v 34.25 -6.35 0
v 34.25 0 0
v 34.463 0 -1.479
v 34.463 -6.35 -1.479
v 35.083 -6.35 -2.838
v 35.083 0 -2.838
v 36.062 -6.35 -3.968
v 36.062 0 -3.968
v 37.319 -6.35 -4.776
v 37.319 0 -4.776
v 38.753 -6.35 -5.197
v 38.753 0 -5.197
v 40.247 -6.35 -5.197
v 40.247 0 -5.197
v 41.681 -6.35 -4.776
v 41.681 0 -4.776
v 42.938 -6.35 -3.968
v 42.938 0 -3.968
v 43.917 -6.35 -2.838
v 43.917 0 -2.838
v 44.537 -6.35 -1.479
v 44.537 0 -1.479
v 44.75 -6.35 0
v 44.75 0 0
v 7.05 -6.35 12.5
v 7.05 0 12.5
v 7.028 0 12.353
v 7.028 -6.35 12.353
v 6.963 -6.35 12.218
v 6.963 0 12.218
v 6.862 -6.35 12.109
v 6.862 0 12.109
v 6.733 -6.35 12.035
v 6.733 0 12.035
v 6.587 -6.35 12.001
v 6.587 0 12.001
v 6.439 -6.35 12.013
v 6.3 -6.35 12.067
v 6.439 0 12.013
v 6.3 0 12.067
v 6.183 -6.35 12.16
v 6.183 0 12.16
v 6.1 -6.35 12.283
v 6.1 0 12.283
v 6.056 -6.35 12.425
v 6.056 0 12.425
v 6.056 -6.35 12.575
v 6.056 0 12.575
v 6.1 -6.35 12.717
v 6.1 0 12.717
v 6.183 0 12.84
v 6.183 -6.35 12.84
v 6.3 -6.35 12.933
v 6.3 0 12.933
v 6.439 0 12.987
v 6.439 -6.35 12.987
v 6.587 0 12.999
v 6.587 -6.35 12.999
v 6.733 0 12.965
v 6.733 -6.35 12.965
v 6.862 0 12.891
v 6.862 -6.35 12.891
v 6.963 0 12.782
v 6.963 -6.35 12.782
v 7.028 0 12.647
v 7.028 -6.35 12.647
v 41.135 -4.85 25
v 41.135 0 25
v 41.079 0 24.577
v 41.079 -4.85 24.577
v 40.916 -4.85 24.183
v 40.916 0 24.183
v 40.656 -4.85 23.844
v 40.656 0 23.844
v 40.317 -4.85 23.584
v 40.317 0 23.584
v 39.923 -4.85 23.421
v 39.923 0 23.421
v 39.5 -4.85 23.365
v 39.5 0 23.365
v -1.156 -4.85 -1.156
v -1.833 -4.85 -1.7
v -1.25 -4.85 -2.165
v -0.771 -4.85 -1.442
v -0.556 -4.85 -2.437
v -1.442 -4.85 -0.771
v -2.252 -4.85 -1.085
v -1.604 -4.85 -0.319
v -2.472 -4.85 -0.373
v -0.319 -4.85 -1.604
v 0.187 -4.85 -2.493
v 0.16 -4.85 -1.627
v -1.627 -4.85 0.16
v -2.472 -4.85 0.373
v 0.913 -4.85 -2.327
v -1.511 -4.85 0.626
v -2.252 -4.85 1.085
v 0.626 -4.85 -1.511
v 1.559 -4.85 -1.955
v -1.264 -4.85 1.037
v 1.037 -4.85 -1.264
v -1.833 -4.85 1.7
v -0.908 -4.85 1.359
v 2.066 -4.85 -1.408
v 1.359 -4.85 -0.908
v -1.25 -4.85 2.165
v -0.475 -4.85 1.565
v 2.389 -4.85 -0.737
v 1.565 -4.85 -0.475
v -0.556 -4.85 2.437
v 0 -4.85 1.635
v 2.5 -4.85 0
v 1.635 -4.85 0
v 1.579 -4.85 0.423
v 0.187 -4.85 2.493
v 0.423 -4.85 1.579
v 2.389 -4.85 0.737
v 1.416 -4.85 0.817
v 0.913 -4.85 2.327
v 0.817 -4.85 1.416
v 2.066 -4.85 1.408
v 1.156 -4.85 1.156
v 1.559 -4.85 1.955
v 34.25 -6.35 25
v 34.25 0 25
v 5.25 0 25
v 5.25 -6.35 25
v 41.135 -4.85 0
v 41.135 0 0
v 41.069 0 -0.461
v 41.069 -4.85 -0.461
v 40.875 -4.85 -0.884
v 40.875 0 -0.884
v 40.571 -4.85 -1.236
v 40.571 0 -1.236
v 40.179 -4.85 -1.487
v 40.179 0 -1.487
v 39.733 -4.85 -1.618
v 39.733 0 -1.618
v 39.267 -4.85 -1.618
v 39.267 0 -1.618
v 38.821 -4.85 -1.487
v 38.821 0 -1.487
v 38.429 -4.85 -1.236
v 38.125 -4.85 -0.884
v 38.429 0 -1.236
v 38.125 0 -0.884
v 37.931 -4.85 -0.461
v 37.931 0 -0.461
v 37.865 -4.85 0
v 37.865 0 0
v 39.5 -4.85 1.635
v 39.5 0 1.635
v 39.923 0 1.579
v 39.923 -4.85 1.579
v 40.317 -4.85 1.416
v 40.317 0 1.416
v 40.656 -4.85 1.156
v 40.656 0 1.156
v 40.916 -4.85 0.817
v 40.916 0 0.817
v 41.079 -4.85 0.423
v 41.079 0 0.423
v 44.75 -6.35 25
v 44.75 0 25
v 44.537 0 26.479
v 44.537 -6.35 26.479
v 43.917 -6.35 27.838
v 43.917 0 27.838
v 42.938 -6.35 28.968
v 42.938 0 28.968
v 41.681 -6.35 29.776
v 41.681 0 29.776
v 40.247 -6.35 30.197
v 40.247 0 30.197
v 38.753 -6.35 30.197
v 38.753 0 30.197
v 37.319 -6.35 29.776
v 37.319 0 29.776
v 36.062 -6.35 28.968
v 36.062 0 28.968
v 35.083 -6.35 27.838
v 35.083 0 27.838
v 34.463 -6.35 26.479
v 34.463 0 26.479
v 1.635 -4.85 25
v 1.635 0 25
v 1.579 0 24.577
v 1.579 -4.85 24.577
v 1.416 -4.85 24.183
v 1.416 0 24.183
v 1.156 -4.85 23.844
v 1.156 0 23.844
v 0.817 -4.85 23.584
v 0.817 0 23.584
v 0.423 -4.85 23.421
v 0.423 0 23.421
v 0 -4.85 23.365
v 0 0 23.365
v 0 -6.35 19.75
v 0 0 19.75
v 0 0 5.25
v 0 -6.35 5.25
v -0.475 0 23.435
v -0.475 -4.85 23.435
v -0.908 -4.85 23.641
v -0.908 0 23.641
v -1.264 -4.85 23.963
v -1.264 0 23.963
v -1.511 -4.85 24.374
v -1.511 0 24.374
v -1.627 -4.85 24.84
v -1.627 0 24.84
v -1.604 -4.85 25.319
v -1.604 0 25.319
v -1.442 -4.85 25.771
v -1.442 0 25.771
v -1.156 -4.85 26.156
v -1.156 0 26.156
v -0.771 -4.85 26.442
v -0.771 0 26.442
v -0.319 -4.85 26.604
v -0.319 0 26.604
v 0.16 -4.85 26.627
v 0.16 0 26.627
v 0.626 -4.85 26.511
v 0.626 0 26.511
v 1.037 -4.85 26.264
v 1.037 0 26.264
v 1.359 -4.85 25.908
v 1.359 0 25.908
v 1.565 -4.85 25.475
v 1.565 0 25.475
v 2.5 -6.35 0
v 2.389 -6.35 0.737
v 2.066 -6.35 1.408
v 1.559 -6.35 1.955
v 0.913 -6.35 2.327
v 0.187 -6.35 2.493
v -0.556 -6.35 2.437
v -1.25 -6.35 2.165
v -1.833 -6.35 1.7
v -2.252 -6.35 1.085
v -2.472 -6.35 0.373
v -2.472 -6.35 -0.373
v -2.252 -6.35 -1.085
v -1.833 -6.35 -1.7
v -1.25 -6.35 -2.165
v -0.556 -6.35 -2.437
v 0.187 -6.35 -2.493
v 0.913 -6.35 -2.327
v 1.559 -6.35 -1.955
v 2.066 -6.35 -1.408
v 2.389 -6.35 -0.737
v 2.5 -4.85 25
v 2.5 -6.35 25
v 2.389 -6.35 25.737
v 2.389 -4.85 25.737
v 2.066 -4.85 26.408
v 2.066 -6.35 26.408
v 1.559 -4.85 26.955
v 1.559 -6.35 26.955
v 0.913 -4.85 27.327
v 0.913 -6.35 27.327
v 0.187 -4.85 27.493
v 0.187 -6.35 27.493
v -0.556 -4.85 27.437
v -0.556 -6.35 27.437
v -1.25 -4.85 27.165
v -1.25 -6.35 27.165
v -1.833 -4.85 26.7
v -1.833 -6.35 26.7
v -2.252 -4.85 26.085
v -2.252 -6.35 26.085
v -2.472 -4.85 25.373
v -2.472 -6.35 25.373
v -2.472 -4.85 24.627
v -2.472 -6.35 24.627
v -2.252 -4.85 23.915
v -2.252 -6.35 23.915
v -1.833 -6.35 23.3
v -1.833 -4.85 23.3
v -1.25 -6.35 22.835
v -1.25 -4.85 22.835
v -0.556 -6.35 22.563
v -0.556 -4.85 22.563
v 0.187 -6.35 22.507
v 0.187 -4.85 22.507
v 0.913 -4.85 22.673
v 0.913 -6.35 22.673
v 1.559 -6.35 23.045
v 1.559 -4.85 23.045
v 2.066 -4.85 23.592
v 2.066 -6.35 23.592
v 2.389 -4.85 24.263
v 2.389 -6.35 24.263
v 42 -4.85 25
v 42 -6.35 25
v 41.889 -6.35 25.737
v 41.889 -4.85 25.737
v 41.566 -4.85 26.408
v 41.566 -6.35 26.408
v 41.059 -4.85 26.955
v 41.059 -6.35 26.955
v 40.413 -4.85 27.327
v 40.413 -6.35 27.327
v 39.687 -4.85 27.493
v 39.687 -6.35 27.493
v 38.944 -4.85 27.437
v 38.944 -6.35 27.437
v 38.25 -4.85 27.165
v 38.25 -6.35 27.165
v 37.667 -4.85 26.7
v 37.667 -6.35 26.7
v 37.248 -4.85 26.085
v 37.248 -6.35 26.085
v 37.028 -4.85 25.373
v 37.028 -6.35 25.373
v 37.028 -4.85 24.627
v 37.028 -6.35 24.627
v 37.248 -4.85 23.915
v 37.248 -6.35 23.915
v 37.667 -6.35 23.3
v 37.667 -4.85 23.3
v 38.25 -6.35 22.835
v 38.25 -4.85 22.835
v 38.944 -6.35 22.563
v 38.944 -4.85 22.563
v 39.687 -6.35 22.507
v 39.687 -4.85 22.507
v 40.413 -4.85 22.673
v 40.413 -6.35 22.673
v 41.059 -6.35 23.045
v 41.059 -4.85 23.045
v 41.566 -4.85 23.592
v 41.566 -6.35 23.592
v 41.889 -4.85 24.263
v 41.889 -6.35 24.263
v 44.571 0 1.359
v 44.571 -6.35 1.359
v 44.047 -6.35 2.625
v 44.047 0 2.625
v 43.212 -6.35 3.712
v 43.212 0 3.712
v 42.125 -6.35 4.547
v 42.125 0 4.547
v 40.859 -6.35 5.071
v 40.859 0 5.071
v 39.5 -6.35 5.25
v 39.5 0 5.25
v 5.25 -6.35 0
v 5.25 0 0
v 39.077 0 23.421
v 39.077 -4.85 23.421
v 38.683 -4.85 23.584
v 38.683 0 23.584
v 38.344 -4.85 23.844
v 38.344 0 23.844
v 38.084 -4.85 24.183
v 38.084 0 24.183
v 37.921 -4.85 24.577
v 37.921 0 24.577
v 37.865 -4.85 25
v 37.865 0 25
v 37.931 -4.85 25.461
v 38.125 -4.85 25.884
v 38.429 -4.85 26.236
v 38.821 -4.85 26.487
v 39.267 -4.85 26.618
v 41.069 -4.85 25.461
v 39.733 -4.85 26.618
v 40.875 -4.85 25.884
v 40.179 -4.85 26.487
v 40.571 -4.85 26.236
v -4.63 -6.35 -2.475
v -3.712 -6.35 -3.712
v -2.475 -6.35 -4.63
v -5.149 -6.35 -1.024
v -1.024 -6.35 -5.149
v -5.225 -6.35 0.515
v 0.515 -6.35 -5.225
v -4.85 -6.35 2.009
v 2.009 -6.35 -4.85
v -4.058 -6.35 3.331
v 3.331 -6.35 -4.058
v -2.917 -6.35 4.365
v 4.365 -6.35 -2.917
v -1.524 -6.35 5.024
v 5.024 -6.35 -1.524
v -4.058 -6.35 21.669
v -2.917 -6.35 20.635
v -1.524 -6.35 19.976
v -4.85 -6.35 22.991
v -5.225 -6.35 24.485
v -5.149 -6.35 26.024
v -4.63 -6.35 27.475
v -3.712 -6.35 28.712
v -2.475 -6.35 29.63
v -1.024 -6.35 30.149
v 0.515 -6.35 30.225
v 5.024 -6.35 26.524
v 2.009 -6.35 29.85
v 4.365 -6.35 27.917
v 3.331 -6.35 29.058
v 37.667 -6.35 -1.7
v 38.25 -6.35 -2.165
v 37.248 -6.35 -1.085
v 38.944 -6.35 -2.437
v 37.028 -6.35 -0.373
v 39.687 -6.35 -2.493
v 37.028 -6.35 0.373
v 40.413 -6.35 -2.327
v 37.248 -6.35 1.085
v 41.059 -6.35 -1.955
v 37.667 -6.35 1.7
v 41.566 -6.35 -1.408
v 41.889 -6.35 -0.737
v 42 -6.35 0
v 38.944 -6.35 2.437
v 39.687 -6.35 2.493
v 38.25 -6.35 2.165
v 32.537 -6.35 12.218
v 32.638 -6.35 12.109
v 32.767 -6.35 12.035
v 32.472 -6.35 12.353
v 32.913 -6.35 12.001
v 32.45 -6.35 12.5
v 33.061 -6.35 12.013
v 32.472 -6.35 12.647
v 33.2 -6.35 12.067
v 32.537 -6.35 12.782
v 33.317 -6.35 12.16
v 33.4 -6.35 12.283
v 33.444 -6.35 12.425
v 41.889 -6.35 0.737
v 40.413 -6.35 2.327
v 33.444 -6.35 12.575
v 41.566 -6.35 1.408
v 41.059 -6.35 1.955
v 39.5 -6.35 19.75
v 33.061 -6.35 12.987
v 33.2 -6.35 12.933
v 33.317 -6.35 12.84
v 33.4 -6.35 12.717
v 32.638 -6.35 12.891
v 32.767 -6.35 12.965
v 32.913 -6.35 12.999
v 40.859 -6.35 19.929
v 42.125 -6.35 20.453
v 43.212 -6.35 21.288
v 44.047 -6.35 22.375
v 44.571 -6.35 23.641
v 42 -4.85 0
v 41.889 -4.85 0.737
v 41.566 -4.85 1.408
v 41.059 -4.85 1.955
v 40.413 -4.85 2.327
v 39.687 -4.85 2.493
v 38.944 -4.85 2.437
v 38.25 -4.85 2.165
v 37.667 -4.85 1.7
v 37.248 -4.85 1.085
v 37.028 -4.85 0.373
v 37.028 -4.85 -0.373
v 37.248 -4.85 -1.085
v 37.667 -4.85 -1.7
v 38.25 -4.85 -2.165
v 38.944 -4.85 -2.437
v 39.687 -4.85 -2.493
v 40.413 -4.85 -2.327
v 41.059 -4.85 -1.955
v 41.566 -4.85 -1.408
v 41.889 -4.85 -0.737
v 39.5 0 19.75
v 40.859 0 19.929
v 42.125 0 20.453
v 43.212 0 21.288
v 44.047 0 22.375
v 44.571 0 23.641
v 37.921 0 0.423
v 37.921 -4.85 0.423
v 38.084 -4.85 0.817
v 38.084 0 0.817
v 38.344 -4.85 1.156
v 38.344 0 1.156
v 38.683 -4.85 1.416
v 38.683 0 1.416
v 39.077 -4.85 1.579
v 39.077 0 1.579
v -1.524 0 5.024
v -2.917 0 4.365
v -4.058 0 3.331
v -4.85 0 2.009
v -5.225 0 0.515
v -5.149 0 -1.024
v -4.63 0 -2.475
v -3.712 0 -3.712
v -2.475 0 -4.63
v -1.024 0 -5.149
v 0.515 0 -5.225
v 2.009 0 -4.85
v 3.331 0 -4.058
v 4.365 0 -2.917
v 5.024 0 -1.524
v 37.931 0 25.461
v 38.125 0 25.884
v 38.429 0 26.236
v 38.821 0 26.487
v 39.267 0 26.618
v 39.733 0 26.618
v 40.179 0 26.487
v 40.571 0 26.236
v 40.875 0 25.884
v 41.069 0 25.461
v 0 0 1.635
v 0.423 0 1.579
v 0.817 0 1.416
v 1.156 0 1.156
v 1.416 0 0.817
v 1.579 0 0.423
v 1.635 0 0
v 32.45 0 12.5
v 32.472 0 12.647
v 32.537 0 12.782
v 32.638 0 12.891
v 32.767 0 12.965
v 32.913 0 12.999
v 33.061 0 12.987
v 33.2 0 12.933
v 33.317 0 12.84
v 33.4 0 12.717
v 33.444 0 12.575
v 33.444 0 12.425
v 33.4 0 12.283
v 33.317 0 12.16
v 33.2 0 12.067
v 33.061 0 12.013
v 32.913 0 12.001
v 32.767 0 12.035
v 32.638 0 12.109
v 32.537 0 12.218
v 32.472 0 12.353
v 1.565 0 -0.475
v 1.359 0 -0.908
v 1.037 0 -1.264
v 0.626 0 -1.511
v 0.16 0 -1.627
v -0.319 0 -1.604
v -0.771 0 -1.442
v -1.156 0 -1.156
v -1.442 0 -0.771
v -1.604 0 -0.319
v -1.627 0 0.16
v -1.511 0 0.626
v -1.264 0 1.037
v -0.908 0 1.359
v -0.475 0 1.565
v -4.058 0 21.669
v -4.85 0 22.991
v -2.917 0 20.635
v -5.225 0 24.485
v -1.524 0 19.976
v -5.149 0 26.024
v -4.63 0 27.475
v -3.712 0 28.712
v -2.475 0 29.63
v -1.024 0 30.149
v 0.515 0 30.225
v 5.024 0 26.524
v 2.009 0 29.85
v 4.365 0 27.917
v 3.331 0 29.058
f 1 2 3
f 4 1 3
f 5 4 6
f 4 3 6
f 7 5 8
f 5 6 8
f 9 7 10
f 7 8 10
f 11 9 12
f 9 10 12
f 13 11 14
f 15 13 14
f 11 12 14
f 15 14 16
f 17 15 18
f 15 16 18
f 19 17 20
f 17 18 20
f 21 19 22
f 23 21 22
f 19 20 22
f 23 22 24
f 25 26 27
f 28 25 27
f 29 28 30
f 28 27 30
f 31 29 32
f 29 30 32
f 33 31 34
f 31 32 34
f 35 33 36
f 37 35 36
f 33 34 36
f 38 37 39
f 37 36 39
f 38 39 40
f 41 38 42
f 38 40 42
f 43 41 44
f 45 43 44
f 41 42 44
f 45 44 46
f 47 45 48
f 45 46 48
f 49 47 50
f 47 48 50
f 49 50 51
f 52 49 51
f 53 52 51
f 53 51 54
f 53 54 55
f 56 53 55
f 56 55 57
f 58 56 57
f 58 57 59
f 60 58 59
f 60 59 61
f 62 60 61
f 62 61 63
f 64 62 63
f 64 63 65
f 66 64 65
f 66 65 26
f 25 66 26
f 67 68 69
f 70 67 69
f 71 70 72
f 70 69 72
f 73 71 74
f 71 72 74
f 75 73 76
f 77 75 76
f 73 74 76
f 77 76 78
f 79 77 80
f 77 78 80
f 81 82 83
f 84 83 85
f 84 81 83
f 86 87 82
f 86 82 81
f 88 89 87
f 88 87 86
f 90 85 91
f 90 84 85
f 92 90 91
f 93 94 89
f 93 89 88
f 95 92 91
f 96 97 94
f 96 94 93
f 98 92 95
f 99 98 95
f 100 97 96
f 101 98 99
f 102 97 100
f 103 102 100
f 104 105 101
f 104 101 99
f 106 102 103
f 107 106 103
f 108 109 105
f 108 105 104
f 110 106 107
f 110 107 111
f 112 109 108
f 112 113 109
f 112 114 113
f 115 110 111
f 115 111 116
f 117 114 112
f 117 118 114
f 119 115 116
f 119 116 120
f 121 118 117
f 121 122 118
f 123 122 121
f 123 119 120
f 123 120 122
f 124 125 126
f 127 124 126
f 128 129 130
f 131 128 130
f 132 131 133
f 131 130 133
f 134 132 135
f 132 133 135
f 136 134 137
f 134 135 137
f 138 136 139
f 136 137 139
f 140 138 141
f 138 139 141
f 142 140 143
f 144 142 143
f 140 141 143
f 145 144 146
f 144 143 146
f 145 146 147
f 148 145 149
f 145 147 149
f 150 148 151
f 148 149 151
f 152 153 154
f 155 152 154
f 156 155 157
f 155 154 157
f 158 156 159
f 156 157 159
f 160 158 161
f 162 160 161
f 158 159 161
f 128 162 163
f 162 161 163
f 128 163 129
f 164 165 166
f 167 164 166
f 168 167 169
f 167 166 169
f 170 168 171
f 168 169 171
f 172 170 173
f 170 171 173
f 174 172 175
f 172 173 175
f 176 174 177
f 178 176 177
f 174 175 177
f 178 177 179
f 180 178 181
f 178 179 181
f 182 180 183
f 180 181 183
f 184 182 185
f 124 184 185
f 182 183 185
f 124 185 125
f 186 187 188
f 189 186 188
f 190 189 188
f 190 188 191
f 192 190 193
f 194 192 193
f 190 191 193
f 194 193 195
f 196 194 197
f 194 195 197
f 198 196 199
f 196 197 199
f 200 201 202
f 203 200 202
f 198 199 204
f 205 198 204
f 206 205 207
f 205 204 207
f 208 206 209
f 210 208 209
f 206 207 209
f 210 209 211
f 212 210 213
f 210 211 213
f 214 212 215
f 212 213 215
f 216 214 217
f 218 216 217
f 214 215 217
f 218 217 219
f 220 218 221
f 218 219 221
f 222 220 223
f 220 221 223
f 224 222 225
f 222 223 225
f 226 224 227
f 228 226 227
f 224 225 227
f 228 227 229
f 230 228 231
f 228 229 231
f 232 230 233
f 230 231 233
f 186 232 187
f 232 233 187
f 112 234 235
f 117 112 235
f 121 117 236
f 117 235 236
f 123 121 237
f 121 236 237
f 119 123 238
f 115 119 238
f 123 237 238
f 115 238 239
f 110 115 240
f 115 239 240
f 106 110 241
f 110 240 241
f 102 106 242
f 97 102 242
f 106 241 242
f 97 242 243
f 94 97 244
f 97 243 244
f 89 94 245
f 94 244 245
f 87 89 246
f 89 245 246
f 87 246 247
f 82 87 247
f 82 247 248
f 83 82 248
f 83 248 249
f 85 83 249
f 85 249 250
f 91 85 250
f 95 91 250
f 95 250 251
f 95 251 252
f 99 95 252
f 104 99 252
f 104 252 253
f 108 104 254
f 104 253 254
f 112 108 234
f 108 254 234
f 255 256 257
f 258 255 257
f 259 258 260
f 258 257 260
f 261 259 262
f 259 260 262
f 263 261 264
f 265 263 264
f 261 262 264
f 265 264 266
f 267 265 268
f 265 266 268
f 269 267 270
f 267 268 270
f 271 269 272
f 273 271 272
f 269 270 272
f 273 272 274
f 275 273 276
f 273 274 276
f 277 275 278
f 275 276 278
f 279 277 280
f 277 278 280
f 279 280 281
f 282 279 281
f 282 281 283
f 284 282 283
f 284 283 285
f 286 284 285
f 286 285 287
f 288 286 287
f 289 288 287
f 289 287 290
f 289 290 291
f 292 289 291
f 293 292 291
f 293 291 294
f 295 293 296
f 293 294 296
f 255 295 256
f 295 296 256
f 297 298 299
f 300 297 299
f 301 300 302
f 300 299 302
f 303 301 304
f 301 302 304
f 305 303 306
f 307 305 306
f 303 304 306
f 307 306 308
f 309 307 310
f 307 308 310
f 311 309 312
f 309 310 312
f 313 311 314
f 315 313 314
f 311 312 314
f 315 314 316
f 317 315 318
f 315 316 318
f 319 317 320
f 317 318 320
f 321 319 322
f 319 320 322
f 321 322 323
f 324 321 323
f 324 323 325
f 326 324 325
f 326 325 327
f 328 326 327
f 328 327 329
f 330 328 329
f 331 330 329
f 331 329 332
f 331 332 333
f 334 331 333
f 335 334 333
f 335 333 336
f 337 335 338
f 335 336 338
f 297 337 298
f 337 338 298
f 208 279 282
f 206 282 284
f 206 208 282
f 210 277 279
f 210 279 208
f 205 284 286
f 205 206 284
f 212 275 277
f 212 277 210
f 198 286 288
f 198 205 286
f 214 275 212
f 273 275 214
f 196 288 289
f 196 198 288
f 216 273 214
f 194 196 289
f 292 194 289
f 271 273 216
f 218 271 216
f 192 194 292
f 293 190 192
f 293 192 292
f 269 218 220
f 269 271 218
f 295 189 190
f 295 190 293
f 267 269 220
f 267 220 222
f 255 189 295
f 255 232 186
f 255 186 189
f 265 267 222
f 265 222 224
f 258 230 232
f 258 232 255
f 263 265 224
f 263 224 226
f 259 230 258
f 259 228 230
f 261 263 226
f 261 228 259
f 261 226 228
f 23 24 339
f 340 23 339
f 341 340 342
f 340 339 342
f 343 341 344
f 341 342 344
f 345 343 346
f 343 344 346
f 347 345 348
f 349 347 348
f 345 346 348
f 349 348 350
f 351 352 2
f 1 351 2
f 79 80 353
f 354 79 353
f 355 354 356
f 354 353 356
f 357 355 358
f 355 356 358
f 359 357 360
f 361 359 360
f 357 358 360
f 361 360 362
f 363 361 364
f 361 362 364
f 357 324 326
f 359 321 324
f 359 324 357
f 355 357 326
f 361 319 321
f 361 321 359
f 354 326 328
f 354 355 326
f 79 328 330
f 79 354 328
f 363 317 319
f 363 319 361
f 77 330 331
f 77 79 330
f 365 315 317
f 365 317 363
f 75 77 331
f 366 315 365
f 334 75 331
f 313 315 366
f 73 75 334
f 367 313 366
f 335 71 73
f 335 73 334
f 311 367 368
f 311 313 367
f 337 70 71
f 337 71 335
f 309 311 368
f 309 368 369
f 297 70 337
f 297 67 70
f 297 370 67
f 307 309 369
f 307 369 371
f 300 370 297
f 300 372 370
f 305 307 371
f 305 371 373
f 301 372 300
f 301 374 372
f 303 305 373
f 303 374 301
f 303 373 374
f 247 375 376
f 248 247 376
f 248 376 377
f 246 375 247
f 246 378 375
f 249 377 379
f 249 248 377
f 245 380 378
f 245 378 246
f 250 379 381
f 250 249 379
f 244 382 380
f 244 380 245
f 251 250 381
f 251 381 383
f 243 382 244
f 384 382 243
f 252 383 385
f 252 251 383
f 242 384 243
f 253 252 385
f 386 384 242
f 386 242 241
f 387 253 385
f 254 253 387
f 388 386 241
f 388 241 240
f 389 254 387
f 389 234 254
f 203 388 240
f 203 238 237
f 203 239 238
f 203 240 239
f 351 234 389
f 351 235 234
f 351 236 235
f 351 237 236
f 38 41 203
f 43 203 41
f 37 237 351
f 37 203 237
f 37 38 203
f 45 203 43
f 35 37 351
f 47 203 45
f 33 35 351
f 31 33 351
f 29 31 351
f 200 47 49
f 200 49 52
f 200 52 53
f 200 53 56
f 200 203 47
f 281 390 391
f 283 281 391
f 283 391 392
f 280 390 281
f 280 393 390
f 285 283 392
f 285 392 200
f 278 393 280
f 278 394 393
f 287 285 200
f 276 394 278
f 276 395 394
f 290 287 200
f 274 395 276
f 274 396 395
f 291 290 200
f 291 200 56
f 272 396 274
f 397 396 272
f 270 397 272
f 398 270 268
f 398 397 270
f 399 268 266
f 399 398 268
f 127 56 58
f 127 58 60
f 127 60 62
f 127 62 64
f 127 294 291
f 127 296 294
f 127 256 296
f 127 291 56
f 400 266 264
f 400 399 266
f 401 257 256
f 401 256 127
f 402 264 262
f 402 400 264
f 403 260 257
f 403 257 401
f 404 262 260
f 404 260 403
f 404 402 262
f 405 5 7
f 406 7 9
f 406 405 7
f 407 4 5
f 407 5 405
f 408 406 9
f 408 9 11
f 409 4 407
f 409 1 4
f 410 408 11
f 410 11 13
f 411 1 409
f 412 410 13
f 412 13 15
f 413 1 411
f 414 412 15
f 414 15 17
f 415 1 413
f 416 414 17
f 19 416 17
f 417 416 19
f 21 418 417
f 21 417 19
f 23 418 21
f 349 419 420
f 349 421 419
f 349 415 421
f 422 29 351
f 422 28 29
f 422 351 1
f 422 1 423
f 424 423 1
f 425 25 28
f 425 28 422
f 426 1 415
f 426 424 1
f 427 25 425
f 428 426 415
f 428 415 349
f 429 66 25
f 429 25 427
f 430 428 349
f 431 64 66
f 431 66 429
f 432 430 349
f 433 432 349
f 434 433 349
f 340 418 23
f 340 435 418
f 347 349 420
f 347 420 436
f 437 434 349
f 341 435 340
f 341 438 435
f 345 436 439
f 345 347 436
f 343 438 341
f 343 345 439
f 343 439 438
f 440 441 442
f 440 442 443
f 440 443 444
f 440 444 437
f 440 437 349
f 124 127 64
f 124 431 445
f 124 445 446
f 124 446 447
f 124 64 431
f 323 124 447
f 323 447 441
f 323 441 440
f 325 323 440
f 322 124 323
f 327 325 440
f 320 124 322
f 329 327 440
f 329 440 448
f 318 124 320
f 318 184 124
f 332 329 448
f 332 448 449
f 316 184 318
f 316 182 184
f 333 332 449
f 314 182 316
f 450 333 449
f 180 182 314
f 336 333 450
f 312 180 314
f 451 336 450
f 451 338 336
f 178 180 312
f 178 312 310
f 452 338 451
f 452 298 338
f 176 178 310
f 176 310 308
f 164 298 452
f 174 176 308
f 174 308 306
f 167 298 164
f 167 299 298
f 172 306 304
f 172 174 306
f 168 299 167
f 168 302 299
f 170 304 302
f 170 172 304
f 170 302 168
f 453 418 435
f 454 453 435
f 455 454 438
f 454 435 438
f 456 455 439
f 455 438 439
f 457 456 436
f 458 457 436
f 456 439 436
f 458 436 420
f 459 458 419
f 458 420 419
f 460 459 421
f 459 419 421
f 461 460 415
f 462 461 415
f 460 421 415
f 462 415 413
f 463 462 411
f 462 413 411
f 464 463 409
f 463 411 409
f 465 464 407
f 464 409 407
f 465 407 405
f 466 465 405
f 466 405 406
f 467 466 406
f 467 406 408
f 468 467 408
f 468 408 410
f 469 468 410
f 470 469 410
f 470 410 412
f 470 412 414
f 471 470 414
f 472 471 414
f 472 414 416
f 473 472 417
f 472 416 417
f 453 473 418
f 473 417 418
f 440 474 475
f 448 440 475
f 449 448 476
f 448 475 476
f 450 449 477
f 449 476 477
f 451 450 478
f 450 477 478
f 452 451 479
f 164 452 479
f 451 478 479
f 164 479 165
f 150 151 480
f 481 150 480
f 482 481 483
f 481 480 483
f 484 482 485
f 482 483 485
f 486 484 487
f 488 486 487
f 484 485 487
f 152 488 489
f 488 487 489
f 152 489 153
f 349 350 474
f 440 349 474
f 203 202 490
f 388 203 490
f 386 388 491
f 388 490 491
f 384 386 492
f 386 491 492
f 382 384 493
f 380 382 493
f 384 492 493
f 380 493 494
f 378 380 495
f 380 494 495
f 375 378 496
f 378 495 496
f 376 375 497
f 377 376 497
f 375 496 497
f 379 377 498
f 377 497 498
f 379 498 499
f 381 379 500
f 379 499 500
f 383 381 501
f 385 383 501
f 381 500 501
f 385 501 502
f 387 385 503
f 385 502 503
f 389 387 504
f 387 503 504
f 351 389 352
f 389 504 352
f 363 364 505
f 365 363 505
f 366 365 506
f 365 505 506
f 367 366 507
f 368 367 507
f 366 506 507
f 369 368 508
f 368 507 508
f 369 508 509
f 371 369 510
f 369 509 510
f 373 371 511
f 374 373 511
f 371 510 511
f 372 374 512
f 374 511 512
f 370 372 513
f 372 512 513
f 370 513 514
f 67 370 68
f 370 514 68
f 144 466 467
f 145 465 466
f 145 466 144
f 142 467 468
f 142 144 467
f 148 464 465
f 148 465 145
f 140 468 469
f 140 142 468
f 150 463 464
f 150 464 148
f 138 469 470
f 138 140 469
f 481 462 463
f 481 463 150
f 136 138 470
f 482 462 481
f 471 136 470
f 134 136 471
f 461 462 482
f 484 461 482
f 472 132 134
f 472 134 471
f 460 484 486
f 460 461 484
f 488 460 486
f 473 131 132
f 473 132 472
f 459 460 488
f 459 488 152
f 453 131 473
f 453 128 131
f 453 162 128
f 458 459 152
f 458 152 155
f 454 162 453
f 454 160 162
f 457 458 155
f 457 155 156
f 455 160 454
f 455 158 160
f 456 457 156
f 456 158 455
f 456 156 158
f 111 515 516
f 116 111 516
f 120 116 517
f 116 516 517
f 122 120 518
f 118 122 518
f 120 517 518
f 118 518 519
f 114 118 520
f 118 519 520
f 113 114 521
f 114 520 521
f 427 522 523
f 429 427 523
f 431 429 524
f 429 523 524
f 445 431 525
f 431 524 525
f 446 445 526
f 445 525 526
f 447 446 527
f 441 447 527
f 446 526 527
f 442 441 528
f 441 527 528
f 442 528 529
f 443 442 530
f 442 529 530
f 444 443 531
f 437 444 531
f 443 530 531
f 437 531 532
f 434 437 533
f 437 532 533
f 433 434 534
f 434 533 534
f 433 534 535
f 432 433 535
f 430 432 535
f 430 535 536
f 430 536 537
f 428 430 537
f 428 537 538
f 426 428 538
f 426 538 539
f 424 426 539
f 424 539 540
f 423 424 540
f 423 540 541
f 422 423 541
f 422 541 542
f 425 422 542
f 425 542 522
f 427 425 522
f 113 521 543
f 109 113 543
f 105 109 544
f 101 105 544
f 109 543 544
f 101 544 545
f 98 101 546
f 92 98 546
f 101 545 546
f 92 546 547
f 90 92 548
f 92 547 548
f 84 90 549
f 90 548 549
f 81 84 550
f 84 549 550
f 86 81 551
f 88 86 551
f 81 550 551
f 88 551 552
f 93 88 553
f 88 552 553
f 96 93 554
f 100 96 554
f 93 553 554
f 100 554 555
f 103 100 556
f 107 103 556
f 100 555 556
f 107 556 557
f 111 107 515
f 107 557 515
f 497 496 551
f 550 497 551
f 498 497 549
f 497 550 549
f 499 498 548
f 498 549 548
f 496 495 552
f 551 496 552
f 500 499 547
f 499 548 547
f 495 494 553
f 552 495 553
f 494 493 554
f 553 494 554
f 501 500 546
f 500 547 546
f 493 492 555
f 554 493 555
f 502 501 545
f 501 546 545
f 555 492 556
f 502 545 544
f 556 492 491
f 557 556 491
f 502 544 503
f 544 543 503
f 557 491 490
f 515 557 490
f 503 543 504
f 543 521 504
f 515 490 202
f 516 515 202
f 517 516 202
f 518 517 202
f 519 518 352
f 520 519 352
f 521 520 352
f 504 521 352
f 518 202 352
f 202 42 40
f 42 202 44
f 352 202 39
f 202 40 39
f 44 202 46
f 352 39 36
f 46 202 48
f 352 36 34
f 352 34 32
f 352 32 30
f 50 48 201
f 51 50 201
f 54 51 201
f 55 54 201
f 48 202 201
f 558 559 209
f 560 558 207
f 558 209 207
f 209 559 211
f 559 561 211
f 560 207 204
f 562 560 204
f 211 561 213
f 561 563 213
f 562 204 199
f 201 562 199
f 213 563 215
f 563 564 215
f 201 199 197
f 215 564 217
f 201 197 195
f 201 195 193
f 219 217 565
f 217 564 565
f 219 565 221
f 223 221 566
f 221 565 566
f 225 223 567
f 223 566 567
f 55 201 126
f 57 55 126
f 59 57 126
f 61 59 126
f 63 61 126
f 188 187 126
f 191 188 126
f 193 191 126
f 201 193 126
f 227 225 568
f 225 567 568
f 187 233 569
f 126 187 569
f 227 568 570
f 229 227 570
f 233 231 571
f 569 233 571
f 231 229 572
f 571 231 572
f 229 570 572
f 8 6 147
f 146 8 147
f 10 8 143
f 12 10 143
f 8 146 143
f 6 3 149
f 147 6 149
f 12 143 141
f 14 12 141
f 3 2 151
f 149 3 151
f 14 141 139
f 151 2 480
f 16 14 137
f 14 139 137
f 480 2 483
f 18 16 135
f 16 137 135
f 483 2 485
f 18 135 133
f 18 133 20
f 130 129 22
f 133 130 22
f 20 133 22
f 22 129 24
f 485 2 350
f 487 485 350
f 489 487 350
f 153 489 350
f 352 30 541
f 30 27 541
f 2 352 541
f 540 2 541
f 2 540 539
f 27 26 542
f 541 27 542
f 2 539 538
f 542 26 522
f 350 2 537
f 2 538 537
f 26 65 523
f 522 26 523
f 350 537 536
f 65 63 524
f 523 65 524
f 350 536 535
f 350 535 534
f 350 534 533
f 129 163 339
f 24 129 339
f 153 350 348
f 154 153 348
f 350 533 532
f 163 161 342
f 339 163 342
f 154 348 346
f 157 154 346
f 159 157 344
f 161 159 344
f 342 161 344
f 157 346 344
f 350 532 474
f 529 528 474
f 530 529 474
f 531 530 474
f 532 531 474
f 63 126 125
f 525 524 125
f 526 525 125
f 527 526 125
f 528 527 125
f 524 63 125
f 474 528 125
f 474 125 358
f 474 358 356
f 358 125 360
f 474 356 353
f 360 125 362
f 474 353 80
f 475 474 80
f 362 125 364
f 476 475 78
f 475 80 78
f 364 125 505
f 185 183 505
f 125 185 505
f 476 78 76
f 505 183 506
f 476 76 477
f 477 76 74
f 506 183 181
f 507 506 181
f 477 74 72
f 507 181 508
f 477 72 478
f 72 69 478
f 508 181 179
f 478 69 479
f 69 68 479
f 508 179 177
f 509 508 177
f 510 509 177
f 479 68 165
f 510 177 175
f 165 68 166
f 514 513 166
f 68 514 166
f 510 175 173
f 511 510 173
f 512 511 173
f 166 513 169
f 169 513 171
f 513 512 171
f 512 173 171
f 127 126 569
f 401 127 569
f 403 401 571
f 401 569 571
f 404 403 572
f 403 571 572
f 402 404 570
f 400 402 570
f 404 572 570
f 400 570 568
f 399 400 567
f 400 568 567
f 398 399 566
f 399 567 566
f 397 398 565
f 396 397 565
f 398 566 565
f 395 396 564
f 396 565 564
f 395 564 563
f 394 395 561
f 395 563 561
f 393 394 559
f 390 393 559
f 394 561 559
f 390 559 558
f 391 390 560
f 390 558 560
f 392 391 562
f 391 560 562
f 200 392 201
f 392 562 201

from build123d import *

# Parameters (mm, degrees)
F1_DEPTH = 6.35
F2_R     = 2.5
F3_DEPTH = 1.5
F4_R     = 0.5
F5_DEPTH = 25.4


with BuildPart() as f1:
    # F0 (on Front) → F1 (new body)
    with BuildSketch(Plane.XZ):
        with BuildLine():
            ThreePointArc((0, 1.635), (1.1561195872, 1.1561195872), (1.635, 0))
            Line((1.635, 0), (5.25, 0))
            ThreePointArc((5.25, 0), (3.7123106012, 3.7123106012), (0, 5.25))
            Line((0, 5.25), (0, 1.635))
        make_face()
        with BuildLine():
            Line((5.25, 0), (1.635, 0))
            ThreePointArc((1.635, 0), (-1.1561195872, -1.1561195872), (0, 1.635))
            Line((0, 1.635), (0, 5.25))
            ThreePointArc((0, 5.25), (-3.7123106012, -3.7123106012), (5.25, 0))
        make_face()
        with BuildLine():
            ThreePointArc((0, 5.25), (3.7123106012, 3.7123106012), (5.25, 0))
            Line((5.25, 0), (34.25, 0))
            ThreePointArc((34.25, 0), (35.7876893988, 3.7123106012), (39.5, 5.25))
            Line((39.5, 5.25), (39.5, 19.75))
            ThreePointArc((39.5, 19.75), (35.7876893988, 21.2876893988), (34.25, 25))
            Line((34.25, 25), (5.25, 25))
            ThreePointArc((5.25, 25), (3.7123106012, 21.2876893988), (0, 19.75))
            Line((0, 19.75), (0, 5.25))
        make_face()
        with BuildLine():
            ThreePointArc((39.5, 5.25), (35.7876893988, 3.7123106012), (34.25, 0))
            Line((34.25, 0), (37.865, 0))
            ThreePointArc((37.865, 0), (38.3438804128, 1.1561195872), (39.5, 1.635))
            Line((39.5, 1.635), (39.5, 5.25))
        make_face()
        with BuildLine():
            Line((37.865, 0), (34.25, 0))
            ThreePointArc((34.25, 0), (39.5, -5.25), (44.75, 0))
            ThreePointArc((44.75, 0), (43.2123106012, 3.7123106012), (39.5, 5.25))
            Line((39.5, 5.25), (39.5, 1.635))
            ThreePointArc((39.5, 1.635), (40.6561195872, 1.1561195872), (41.135, 0))
            ThreePointArc((41.135, 0), (39.5, -1.635), (37.865, 0))
        make_face()
        with BuildLine():
            ThreePointArc((5.25, 25), (-3.7123106012, 28.7123106012), (0, 19.75))
            Line((0, 19.75), (0, 23.365))
            ThreePointArc((0, 23.365), (-1.1561195872, 26.1561195872), (1.635, 25))
            Line((1.635, 25), (5.25, 25))
        make_face()
        with BuildLine():
            Line((0, 23.365), (0, 19.75))
            ThreePointArc((0, 19.75), (3.7123106012, 21.2876893988), (5.25, 25))
            Line((5.25, 25), (1.635, 25))
            ThreePointArc((1.635, 25), (1.1561195872, 23.8438804128), (0, 23.365))
        make_face()
        with BuildLine():
            ThreePointArc((34.25, 25), (35.7876893988, 21.2876893988), (39.5, 19.75))
            Line((39.5, 19.75), (39.5, 23.365))
            ThreePointArc((39.5, 23.365), (38.3438804128, 23.8438804128), (37.865, 25))
            Line((37.865, 25), (34.25, 25))
        make_face()
        with BuildLine():
            Line((39.5, 23.365), (39.5, 19.75))
            ThreePointArc((39.5, 19.75), (43.2123106012, 21.2876893988), (44.75, 25))
            ThreePointArc((44.75, 25), (39.5, 30.25), (34.25, 25))
            Line((34.25, 25), (37.865, 25))
            ThreePointArc((37.865, 25), (39.5, 26.635), (41.135, 25))
            ThreePointArc((41.135, 25), (40.6561195872, 23.8438804128), (39.5, 23.365))
        make_face()
    extrude(amount=F1_DEPTH)

    # F2 (on face) → F3 (cut)
    with BuildSketch(Plane.XZ.offset(6.35)):
        with Locations((0, 25)):
            Circle(F2_R)
        with Locations((39.5, 25)):
            Circle(F2_R)
        with Locations((39.5, 0)):
            Circle(F2_R)
        Circle(F2_R)
    extrude(amount=-F3_DEPTH, mode=Mode.SUBTRACT)

    # F4 (on face) → F5 (cut)
    with BuildSketch(Plane(origin=(0, 0, 0), x_dir=(-1, 0, 0), z_dir=(0, 1, 0))):
        with Locations((-32.95, 12.5)):
            Circle(F4_R)
        with BuildLine():
            ThreePointArc((-6.05, 12.5), (-6.55, 13), (-7.05, 12.5))
            ThreePointArc((-7.05, 12.5), (-6.55, 12), (-6.05, 12.5))
        make_face()
    extrude(amount=-F5_DEPTH, mode=Mode.SUBTRACT)


solid = f1.part
